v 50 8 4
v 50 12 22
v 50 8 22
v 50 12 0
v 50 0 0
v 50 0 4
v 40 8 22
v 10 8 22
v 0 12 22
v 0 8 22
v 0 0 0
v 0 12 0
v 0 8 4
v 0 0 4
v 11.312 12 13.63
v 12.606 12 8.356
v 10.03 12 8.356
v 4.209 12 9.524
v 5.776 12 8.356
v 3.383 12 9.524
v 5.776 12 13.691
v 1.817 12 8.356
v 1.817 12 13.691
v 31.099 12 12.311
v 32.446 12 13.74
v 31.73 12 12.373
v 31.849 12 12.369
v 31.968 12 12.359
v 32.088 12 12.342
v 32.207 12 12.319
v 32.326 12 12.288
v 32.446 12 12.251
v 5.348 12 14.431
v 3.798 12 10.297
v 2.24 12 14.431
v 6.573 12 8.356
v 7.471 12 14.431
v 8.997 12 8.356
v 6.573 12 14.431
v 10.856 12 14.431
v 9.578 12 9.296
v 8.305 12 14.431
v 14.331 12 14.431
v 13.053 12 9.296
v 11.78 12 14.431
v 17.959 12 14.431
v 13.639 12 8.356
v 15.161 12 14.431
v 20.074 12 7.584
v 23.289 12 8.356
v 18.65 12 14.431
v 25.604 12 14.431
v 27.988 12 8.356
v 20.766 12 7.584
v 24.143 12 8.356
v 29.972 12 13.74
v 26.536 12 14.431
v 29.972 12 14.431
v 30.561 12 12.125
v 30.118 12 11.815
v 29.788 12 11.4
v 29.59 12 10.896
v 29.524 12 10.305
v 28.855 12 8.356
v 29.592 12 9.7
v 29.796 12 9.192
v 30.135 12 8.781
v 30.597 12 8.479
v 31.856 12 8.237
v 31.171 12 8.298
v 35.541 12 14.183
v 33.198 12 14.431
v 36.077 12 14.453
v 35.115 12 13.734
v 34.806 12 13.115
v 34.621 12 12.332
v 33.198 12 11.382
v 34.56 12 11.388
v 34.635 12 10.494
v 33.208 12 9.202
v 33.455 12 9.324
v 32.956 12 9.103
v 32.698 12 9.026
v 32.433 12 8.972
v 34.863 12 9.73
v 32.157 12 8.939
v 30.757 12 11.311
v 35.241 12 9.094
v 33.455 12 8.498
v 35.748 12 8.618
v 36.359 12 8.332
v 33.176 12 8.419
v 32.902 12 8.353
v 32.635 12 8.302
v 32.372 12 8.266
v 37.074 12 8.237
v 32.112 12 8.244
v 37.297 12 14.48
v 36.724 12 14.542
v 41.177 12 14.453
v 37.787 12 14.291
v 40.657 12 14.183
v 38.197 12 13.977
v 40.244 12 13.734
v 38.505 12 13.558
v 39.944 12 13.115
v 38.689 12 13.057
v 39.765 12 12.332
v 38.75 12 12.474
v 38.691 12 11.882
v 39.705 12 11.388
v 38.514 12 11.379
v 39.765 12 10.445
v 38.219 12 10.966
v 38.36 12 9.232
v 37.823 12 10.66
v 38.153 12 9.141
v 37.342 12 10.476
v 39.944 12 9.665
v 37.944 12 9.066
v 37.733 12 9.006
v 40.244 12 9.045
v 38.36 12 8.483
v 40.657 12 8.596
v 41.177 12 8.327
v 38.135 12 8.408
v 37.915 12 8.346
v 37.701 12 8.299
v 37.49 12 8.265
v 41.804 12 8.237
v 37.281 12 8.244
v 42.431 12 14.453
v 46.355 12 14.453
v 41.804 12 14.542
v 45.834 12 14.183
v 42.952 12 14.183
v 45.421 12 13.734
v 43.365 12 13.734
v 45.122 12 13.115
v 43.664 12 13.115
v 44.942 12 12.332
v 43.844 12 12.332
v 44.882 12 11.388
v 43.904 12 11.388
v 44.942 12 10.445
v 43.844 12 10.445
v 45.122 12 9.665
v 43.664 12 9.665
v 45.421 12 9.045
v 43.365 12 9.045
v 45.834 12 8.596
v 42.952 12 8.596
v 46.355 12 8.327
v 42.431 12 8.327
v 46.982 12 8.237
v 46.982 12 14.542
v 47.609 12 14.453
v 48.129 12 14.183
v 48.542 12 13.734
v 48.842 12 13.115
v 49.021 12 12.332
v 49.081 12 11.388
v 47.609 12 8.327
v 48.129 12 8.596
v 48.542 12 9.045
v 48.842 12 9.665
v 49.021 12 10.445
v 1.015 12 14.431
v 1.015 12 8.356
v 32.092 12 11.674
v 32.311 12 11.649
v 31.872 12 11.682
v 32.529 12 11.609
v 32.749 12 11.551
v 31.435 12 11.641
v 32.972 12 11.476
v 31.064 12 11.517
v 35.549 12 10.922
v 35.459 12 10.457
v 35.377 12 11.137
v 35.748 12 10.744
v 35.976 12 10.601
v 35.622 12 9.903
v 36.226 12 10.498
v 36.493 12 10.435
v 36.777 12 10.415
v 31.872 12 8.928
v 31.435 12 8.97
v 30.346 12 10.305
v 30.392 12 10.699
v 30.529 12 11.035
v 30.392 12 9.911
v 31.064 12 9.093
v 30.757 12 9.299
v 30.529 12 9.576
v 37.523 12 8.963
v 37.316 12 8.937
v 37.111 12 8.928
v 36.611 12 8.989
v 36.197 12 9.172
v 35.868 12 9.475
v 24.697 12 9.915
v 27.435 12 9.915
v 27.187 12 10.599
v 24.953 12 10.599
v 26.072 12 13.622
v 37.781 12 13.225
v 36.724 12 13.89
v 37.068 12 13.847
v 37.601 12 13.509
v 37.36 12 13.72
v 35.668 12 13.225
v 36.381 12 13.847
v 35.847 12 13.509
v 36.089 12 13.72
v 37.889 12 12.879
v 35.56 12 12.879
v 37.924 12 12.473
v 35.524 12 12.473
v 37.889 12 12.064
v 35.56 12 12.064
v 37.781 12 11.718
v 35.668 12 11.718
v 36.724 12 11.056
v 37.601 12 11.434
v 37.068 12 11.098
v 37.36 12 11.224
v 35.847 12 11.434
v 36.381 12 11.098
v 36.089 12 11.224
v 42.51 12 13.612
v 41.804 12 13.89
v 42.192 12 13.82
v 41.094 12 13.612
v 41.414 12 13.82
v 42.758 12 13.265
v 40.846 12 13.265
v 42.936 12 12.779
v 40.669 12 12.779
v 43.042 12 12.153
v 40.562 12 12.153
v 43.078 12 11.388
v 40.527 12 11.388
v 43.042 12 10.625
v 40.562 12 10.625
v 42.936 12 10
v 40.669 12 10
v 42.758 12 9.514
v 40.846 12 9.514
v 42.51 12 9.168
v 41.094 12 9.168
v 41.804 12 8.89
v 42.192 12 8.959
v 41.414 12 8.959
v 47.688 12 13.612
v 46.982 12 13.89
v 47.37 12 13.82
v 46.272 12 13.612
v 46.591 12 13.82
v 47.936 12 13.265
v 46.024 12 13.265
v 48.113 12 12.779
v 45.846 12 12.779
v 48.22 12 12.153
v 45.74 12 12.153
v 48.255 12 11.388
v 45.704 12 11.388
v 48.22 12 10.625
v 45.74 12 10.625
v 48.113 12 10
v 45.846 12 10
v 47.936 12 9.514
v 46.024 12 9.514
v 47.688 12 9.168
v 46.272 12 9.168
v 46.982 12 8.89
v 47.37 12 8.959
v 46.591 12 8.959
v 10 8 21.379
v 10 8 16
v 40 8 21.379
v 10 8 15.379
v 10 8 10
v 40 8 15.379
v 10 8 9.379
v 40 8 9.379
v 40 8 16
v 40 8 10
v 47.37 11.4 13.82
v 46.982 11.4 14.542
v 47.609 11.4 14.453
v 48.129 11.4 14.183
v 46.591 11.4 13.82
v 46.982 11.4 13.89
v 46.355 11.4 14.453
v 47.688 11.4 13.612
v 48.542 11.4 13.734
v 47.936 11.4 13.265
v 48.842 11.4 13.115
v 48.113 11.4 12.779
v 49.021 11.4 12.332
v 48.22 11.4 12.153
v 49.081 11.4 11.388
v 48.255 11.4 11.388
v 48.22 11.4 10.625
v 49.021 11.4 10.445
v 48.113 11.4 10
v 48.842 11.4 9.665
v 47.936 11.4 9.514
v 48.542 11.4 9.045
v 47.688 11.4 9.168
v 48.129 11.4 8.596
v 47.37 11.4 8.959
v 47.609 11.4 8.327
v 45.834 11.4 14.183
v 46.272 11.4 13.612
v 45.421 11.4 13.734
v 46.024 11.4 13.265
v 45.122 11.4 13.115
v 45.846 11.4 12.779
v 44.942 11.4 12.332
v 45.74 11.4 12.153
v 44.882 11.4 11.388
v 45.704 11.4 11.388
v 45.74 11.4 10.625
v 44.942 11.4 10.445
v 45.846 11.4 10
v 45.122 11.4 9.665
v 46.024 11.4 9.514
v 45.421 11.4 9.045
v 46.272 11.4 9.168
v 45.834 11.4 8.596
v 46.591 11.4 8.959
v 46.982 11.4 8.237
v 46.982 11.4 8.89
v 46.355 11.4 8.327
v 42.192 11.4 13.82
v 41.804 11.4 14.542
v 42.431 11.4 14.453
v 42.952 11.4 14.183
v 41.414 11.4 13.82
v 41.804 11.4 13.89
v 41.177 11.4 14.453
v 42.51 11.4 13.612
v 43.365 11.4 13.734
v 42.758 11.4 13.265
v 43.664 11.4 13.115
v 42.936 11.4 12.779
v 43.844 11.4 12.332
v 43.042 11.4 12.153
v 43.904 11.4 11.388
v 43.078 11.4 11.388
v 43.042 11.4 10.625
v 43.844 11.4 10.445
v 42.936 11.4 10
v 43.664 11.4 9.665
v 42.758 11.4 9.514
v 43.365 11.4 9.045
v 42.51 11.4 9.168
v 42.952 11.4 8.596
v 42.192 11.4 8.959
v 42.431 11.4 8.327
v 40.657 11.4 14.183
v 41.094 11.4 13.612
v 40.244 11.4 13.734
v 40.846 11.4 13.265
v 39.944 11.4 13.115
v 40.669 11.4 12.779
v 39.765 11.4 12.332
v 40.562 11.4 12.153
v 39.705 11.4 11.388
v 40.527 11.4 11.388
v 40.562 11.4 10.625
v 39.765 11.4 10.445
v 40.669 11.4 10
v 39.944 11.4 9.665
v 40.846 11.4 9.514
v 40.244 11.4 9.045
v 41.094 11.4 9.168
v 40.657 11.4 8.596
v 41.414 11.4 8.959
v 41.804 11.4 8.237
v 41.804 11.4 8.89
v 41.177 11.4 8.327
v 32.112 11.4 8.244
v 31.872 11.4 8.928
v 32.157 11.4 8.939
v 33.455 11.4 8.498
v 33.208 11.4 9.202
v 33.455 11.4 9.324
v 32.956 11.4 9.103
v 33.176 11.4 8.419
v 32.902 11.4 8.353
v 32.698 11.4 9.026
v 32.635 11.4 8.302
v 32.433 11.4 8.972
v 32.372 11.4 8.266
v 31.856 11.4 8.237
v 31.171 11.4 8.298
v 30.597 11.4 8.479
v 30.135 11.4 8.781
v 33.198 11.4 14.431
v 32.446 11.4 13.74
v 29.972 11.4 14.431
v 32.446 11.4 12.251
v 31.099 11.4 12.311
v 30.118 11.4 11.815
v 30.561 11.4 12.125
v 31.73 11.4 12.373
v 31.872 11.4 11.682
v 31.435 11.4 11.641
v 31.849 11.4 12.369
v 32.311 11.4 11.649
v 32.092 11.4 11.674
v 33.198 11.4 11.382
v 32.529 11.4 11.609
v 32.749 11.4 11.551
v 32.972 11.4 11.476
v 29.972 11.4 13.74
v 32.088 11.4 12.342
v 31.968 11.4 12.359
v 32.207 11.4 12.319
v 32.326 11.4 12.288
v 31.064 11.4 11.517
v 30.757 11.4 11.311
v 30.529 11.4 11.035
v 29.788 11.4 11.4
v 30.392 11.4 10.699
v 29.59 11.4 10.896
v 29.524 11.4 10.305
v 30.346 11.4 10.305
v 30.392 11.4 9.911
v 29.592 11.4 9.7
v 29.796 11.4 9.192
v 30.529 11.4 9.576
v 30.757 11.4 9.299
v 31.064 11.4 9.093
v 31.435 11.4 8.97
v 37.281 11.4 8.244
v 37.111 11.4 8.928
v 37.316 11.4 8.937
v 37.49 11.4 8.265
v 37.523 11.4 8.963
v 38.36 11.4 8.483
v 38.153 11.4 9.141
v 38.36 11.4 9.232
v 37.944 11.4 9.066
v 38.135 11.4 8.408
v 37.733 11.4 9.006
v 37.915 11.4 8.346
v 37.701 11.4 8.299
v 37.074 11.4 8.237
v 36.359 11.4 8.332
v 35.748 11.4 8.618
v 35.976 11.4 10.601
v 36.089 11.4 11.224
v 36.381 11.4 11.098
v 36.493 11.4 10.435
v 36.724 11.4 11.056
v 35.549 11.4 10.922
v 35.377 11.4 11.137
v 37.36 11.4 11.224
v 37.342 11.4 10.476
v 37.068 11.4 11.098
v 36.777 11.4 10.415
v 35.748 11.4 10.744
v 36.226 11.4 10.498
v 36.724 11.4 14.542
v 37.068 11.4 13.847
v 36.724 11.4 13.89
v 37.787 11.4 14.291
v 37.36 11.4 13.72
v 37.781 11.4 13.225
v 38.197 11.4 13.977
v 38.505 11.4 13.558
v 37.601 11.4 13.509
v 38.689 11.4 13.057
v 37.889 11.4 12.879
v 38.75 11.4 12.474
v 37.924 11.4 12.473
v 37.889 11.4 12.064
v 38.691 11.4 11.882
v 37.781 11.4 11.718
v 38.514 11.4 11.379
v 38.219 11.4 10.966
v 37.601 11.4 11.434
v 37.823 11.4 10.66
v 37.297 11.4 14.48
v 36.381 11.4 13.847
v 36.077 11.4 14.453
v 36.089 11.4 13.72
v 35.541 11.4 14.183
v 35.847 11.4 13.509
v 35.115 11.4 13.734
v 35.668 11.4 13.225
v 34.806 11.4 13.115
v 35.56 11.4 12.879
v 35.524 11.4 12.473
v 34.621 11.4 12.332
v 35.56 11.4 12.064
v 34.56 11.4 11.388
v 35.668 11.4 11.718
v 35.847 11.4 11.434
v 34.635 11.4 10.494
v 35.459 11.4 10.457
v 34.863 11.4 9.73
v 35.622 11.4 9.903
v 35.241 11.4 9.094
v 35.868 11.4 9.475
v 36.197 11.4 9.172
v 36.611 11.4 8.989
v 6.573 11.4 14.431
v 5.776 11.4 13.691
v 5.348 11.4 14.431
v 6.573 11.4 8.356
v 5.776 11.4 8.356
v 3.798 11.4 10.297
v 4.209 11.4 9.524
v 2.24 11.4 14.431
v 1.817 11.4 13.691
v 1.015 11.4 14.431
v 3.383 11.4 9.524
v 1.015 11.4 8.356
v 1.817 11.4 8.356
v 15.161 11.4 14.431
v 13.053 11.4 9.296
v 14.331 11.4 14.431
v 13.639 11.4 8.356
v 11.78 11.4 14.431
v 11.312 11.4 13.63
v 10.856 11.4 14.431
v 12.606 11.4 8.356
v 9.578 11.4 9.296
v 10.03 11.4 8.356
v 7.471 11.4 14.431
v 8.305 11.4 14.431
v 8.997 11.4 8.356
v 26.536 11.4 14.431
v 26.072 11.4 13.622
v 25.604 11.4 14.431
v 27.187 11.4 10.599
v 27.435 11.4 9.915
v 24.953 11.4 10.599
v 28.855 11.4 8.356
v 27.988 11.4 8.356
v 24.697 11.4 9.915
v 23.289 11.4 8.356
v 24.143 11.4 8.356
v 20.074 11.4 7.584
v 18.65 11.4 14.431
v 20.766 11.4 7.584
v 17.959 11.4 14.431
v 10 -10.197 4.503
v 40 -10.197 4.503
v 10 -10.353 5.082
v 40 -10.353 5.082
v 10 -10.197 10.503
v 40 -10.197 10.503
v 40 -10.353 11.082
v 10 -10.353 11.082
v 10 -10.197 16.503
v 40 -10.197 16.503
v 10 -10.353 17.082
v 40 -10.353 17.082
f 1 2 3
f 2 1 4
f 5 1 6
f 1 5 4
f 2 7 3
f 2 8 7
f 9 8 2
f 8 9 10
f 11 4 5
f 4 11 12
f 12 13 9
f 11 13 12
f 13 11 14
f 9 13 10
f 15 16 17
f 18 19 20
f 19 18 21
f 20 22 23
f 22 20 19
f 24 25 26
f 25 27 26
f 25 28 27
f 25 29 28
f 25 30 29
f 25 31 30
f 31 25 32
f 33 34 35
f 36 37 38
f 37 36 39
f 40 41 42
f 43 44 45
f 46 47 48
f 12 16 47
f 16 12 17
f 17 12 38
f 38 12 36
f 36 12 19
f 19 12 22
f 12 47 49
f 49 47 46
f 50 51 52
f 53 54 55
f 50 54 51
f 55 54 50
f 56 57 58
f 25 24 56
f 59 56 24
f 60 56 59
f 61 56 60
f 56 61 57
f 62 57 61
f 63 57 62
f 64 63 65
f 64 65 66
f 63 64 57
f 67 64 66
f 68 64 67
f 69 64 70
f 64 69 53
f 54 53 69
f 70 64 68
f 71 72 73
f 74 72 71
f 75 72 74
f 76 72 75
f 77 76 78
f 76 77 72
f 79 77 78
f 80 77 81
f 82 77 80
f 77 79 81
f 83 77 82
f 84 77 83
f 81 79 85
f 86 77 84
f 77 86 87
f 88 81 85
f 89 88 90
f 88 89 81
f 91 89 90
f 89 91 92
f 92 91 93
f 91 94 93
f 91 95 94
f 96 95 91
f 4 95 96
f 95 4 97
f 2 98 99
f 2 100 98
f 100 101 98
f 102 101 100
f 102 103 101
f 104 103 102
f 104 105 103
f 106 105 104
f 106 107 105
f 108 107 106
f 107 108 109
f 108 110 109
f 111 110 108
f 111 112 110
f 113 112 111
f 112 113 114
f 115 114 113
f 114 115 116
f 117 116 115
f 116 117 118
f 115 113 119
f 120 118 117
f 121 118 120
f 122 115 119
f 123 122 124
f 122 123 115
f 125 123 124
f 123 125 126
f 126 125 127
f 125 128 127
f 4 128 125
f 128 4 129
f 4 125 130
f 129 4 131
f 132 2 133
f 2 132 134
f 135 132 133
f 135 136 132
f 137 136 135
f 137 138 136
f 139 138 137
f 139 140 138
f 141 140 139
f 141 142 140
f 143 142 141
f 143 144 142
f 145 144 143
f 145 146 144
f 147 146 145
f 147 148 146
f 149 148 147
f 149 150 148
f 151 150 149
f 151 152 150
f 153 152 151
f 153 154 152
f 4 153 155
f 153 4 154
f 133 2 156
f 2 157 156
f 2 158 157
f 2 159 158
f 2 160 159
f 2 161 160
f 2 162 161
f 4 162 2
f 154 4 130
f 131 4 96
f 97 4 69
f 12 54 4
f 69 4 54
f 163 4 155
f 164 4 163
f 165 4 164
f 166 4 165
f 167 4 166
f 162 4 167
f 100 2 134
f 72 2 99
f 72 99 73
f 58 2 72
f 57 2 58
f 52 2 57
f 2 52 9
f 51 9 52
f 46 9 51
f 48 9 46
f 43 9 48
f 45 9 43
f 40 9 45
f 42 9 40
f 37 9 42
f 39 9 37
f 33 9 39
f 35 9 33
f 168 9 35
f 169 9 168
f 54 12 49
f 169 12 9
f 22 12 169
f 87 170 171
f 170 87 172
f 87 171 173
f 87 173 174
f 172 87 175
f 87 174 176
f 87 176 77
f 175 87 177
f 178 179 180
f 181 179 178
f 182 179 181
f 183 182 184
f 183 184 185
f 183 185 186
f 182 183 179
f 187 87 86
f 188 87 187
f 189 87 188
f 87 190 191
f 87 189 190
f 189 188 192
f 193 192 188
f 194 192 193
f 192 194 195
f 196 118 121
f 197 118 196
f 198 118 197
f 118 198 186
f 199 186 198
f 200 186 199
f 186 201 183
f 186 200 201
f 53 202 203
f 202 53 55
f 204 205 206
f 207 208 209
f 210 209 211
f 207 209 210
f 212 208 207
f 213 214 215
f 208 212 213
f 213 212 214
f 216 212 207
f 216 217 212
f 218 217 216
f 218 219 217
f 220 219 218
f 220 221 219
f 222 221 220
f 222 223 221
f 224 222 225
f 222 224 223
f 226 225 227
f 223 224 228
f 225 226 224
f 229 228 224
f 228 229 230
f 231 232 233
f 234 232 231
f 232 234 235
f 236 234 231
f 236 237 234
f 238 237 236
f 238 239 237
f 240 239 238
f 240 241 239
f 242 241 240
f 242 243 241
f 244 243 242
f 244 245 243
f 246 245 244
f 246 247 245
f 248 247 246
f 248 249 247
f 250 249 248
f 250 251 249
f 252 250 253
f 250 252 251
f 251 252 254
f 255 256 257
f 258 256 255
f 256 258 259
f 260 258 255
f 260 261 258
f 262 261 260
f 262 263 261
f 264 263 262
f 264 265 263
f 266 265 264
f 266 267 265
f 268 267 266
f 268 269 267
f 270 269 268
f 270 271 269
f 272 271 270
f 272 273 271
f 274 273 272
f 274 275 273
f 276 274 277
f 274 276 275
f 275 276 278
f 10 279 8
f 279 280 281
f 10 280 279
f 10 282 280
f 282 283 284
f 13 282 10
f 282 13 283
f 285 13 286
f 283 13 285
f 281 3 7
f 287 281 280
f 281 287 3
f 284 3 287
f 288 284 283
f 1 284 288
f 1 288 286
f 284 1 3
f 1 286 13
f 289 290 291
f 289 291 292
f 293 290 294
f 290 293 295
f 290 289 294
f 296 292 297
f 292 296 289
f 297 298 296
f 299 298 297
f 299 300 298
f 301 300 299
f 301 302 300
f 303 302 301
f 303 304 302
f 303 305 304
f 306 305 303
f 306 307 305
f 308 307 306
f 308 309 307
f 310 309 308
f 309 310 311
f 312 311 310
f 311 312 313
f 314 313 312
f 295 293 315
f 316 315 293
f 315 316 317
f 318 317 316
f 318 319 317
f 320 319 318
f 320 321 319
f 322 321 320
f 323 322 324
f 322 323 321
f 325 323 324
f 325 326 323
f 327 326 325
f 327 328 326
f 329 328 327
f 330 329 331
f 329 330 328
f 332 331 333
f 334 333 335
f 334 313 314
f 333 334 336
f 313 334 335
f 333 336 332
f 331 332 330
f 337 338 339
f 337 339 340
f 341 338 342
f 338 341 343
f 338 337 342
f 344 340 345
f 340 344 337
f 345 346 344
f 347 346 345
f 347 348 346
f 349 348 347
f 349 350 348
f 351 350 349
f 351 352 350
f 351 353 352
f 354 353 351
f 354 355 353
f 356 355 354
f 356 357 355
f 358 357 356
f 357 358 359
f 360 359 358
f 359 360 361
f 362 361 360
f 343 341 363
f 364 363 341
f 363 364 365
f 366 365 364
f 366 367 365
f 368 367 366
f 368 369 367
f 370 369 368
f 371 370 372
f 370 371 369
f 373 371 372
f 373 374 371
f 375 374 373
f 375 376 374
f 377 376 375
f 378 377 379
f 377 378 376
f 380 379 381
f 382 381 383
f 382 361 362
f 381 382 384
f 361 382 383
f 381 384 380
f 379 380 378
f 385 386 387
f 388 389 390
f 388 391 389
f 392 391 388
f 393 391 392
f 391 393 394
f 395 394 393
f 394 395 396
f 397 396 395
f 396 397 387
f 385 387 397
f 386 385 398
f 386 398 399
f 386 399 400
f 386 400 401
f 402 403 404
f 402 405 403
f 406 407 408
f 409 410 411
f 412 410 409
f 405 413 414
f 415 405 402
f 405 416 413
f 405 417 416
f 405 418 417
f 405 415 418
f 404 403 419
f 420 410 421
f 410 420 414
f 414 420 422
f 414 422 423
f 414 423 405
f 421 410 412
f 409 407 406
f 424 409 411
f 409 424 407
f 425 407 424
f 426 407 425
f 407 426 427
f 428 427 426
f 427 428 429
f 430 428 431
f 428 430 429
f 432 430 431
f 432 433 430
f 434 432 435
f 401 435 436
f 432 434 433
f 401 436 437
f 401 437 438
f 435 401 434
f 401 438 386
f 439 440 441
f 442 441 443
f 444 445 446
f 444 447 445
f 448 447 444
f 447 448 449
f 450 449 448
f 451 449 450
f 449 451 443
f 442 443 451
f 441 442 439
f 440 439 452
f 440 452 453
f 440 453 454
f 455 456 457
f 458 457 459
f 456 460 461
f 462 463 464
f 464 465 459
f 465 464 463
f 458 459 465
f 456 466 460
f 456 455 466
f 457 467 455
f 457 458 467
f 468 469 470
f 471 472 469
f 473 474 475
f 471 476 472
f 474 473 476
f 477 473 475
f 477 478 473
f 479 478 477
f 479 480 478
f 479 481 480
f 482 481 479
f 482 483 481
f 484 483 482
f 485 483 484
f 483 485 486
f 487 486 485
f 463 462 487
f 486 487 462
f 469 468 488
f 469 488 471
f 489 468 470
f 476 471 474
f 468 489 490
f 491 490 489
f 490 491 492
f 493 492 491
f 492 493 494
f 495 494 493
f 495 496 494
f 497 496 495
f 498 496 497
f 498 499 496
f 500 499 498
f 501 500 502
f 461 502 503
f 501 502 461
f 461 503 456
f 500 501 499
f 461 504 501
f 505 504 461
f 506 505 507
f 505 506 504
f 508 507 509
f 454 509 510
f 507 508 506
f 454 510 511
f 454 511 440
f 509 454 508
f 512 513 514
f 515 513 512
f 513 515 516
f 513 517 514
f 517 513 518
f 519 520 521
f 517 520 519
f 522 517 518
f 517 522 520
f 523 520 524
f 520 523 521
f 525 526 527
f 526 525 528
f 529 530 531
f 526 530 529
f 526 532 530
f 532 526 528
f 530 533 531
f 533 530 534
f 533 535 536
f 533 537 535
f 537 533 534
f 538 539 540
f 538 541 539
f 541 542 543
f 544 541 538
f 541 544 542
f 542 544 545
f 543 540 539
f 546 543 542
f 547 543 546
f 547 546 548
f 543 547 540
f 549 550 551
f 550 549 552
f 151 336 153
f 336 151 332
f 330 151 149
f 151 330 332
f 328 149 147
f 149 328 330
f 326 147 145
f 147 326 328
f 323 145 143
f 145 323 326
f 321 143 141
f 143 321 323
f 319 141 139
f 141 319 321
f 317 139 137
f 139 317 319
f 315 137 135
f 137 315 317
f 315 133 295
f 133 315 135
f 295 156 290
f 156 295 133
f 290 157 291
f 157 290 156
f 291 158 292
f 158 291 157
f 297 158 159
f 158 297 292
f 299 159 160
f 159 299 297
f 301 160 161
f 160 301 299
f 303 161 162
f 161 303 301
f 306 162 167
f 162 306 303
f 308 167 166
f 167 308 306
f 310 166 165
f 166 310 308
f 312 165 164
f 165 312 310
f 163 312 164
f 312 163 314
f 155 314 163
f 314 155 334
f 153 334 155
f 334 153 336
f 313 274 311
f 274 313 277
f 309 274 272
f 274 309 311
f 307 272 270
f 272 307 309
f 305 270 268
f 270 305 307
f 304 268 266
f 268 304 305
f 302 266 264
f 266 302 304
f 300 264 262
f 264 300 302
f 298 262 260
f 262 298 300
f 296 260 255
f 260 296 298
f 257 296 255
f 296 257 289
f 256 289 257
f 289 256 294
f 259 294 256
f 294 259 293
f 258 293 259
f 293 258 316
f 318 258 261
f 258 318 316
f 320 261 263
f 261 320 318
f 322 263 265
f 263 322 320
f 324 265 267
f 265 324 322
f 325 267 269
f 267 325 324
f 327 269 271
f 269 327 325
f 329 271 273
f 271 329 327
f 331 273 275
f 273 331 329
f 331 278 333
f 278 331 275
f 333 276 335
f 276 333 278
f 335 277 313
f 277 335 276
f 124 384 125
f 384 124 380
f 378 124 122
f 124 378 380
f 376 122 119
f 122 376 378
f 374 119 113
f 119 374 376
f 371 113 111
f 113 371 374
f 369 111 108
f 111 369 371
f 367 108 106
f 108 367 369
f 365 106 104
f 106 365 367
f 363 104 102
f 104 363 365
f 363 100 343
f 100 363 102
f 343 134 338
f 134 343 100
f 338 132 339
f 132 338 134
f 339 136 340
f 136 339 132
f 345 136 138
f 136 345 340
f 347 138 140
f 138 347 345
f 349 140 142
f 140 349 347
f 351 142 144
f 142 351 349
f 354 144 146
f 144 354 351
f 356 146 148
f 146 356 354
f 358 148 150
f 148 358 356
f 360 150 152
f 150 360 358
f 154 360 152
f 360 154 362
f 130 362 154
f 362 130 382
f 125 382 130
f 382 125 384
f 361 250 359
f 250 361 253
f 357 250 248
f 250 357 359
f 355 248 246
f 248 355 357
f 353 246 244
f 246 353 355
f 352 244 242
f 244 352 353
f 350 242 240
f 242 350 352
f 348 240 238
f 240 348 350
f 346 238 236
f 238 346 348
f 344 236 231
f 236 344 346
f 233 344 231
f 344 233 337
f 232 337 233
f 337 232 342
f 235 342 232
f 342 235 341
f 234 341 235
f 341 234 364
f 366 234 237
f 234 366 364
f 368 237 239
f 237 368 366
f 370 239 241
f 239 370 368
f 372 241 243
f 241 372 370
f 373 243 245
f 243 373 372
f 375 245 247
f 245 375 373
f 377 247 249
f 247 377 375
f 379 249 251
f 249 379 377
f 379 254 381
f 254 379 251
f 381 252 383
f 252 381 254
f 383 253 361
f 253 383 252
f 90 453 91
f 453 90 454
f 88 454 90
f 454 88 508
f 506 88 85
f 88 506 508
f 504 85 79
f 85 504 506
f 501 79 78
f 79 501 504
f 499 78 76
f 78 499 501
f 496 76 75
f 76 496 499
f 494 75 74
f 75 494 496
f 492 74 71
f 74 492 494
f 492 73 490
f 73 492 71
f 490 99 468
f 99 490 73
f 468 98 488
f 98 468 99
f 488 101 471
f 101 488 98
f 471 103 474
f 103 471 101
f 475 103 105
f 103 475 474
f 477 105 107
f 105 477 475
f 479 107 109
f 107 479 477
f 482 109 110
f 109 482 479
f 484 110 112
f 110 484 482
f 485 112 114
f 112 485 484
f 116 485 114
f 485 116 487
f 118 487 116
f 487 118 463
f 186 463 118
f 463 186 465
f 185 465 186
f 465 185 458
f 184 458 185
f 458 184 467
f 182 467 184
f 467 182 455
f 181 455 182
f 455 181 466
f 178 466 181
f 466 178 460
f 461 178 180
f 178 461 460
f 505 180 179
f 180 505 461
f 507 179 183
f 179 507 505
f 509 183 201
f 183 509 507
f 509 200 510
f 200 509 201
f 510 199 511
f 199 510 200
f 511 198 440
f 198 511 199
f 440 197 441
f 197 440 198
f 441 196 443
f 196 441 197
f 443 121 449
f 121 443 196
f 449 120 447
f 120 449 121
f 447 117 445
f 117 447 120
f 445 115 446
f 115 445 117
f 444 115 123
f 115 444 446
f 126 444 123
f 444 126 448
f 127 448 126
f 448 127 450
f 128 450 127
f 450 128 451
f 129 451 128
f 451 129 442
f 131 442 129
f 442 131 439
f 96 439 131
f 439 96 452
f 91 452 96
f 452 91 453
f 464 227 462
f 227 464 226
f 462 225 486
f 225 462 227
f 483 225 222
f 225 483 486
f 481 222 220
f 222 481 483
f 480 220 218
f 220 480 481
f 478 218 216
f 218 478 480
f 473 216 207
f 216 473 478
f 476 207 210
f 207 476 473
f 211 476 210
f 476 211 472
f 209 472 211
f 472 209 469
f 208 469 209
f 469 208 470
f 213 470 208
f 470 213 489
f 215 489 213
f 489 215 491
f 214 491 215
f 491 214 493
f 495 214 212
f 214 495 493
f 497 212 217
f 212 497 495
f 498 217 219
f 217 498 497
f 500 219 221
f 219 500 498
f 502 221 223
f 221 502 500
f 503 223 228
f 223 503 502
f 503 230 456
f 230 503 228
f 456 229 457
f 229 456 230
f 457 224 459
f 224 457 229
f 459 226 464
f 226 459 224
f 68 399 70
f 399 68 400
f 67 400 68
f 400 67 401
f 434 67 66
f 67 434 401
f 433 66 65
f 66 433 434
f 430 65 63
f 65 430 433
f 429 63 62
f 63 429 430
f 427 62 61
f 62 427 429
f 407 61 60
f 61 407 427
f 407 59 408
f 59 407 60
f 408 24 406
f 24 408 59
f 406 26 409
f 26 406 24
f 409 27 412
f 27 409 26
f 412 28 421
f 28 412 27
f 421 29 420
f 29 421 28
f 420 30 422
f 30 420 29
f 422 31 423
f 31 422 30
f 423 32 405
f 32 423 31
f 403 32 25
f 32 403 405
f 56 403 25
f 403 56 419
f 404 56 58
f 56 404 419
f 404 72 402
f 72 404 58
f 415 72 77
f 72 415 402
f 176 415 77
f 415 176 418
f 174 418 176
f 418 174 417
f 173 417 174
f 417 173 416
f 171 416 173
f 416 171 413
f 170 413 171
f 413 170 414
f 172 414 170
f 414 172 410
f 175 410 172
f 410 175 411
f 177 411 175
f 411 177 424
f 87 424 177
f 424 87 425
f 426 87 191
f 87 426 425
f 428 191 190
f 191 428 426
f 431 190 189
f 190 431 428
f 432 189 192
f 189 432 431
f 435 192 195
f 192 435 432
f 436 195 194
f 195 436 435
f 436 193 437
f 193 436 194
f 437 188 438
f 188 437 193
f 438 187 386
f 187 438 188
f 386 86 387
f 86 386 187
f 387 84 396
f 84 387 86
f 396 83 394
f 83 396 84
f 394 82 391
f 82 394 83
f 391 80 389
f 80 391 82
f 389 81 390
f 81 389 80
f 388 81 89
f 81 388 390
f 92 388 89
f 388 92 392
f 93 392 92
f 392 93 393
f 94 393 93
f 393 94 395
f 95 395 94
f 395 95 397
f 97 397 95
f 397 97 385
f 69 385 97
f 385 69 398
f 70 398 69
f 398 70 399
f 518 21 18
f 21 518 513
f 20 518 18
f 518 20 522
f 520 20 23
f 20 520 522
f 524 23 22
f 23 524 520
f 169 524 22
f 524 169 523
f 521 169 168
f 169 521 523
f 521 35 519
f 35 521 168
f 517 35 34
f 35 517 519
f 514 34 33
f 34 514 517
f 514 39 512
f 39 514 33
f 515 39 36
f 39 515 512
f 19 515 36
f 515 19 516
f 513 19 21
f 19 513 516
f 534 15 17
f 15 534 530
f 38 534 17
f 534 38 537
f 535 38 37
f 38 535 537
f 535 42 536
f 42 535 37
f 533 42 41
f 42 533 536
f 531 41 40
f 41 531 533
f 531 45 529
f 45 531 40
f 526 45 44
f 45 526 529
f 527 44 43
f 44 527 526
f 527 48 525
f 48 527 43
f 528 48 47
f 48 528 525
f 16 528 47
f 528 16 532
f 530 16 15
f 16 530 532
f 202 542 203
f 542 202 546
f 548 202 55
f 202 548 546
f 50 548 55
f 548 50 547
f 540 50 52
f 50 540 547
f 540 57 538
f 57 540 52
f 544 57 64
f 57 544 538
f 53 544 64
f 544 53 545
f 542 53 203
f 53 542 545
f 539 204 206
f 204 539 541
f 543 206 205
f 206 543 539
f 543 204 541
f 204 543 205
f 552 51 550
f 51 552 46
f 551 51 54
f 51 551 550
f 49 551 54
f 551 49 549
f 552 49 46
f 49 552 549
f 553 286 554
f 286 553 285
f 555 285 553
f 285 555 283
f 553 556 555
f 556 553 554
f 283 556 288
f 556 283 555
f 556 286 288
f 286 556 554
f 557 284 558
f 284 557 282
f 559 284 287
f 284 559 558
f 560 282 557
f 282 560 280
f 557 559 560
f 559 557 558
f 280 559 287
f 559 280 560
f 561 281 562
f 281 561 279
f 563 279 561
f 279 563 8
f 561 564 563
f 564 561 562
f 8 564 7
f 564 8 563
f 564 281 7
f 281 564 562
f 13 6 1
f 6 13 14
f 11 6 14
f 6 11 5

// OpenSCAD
// Bracket for holding wood in aluminum channel

base_w = 50;
base_l = 12;
base_d = 4;

back_h = 22;

shelf_w = 30;
shelf_thickness = 0.6;
shelf_count = 3;
shelf_l = 19;
// in degrees
shelf_angle = -15;

label_text = "0095A / WM";
label_font = "Aldo";
label_deboss = 0.6;
label_font_size = 6;


cube([base_w, base_l, base_d]);

back_delta_y = base_l - base_d;
translate(v = [0, back_delta_y, 0])
difference() {
    cube([base_w, base_d, back_h]);

    translate(v = [base_w / 2, base_d - label_deboss, back_h / 2]) 
    rotate(a = [90, 0, 180])
    linear_extrude(height = label_deboss + 0.01) {
        text(
            text = label_text,
            size = label_font_size,
            font = label_font,
            halign = "center",
            valign = "center"
        );
    }
}

shelf_delta_z = (back_h - base_d) / (shelf_count);
shelf_delta_x = (base_w - shelf_w) / 2;
for (i = [1:shelf_count]) {
    translate(v = [shelf_delta_x, back_delta_y, i * shelf_delta_z + base_d])
        rotate(a=[-1 * shelf_angle, 180 , 180])
        cube([shelf_w, shelf_l, shelf_thickness]);
}
